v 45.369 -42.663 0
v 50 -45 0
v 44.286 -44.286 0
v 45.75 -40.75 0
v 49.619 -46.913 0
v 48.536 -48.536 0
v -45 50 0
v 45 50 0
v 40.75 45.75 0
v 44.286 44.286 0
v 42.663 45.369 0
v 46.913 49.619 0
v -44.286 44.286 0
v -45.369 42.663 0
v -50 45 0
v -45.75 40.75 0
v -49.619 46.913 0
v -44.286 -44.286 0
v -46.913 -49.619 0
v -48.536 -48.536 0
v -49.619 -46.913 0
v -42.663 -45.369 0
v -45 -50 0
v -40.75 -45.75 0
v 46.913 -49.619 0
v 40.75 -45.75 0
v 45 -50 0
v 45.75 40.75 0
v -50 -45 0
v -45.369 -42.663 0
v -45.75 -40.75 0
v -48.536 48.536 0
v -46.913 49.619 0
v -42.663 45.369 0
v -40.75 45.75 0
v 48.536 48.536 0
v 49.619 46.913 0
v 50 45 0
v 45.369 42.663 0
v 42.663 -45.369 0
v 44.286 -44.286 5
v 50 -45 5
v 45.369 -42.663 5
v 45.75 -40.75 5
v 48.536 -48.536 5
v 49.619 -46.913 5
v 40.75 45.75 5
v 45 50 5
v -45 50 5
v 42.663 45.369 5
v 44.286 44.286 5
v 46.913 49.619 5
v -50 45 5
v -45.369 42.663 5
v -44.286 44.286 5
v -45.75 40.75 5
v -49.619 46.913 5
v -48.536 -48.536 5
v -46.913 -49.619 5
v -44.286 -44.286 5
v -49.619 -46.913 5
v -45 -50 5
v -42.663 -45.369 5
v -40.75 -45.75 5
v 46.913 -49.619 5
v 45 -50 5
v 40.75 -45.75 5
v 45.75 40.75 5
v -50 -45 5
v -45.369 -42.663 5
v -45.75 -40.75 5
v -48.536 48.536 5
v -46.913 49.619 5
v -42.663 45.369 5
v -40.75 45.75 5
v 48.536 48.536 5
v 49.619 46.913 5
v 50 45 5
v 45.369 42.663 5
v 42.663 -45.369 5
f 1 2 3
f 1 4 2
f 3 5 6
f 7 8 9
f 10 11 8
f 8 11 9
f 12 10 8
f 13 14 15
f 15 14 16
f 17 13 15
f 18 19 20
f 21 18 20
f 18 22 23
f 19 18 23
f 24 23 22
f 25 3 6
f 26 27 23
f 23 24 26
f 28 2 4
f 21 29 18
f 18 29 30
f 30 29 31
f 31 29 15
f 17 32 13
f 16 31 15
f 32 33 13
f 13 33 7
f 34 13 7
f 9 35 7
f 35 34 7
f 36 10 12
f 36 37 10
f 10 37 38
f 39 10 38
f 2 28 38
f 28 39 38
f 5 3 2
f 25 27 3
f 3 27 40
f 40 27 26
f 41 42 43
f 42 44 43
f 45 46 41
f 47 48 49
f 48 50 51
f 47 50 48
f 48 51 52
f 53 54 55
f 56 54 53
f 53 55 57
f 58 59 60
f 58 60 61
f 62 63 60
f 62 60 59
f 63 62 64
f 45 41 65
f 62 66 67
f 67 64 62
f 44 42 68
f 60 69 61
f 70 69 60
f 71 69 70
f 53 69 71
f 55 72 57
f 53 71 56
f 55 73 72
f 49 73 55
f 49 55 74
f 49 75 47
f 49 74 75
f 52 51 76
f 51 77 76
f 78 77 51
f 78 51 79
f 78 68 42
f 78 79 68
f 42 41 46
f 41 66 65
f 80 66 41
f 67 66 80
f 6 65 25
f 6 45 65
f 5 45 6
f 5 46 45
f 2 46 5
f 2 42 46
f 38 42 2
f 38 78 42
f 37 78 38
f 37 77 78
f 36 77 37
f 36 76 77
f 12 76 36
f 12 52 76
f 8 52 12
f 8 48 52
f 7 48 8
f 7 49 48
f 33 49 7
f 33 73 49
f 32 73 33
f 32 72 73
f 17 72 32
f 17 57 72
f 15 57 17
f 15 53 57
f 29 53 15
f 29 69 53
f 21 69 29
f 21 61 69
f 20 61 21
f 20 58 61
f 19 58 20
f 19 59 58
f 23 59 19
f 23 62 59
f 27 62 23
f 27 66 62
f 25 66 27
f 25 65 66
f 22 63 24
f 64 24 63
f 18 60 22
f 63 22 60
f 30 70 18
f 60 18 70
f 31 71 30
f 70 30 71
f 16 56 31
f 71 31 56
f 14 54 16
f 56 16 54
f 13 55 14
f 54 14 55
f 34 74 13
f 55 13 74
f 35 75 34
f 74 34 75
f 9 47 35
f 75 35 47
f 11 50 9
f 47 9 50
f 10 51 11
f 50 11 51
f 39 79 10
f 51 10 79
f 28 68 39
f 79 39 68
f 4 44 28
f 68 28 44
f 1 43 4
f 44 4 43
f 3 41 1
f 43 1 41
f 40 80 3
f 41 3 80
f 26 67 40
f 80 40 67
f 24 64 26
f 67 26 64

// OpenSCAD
lamp_shell(5);

module lamp_shell(height)
{
  // Represents the glass wall of the Ikea lamp.
  // This needs to be cut out of the lid object
  linear_extrude(height)  
    difference()
    {
      outer_r = 5;
      outer_size = 100;
      inner_r = 5;
      inner_size = 91.5;
      minkowski()
      {
        square(outer_size-outer_r*2, center=true);
        circle(r=outer_r);
      }
      minkowski()
      {
        square(inner_size-inner_r*2, center=true);
        circle(r=inner_r);
      }
    }
}
